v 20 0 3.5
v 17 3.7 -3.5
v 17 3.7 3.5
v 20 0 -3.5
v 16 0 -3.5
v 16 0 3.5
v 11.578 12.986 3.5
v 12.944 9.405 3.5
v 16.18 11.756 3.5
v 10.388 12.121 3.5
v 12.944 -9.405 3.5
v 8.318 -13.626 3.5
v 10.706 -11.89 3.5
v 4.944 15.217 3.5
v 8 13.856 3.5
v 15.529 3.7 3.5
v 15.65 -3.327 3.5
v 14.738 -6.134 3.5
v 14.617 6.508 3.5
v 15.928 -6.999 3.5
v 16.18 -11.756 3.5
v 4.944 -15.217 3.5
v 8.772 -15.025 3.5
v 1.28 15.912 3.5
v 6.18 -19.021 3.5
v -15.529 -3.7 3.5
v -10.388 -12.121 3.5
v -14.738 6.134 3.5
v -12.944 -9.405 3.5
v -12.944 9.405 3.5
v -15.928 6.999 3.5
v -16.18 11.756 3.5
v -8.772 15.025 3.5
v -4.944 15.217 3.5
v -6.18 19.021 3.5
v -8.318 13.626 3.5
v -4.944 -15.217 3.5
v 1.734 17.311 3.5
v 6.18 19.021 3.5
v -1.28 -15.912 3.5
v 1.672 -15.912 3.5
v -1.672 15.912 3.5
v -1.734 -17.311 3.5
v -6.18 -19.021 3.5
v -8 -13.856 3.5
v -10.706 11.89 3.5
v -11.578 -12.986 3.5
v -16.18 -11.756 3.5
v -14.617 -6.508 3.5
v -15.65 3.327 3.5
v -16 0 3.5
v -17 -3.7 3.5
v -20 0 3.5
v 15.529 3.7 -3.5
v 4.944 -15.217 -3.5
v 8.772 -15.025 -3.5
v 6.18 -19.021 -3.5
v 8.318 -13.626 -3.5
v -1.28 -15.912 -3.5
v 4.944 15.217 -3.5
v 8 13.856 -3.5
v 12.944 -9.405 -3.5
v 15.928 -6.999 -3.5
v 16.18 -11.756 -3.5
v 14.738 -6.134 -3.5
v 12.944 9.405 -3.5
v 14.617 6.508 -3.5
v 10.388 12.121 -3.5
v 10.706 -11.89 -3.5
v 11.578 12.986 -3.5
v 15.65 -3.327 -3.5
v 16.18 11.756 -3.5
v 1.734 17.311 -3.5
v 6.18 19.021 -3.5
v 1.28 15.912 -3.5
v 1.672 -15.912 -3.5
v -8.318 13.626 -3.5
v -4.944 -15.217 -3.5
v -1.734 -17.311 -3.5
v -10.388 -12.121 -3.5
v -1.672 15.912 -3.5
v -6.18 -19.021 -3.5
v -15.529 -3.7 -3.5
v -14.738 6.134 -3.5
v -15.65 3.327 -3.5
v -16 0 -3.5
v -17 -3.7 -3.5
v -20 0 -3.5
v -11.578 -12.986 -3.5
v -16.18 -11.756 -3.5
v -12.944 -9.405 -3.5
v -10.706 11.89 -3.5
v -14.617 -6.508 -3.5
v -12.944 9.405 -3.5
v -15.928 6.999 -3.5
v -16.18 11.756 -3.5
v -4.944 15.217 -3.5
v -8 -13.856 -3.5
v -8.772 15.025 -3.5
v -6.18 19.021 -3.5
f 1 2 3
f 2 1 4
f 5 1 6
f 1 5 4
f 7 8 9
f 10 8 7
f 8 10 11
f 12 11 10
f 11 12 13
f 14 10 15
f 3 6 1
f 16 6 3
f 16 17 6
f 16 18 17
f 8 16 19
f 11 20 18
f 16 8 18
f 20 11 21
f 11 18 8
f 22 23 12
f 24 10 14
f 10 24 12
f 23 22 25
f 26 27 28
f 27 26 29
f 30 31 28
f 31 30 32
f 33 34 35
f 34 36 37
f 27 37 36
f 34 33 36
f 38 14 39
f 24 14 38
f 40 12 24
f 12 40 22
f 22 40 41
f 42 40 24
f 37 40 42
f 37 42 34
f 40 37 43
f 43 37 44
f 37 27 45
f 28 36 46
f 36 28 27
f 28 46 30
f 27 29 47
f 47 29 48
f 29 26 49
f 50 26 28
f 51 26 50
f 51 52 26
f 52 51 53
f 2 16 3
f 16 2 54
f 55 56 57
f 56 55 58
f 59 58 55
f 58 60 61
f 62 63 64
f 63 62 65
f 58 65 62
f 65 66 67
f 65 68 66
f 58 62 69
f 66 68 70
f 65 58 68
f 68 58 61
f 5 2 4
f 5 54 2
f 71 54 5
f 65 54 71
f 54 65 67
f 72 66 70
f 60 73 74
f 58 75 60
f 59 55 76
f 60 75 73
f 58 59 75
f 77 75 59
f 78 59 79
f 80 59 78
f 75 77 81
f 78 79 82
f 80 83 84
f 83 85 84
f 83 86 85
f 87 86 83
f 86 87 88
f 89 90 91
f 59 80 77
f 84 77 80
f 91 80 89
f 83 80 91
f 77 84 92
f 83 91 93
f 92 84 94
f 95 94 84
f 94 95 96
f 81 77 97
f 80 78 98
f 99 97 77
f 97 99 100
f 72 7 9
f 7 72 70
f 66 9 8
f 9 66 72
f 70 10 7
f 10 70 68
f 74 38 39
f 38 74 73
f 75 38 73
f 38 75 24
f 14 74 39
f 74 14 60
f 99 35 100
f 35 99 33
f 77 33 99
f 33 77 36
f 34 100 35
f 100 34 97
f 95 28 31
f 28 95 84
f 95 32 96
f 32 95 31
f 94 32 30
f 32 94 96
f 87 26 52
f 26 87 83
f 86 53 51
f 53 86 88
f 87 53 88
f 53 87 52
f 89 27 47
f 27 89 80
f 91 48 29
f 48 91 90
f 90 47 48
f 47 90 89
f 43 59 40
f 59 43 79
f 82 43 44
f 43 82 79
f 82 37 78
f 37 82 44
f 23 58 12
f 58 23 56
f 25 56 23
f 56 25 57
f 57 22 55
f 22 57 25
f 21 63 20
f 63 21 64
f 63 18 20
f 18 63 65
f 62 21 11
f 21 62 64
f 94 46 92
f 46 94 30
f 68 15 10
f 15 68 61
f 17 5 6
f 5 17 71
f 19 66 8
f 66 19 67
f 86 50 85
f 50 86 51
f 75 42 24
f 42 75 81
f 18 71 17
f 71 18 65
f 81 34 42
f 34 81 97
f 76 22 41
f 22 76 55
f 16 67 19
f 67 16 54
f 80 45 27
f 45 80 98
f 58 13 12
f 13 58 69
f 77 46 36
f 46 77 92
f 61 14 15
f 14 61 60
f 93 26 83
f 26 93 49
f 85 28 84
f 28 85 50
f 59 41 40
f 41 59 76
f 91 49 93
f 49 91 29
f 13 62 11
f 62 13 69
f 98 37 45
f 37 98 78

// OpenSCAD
union(){
cylinder(7,16,16,$fn=30,center= true);


for (i=[0:45:359]) {
    r = 15; // pattern radius
    n = 10; // number of cars
step = 360/n;
for (i=[0:step:359]) {
    angle = i;
    dx = r*cos(angle);
    dy = r*sin(angle);
    translate([dx,dy,0])
    rotate([0,0,angle])
   
    {
    
linear_extrude(7, scale = 1, center = true)
polygon(points=[[0,0],[5,0],[2,3.7],[-2,3.7],[-5,0]]);
     
}    
}
}


}
